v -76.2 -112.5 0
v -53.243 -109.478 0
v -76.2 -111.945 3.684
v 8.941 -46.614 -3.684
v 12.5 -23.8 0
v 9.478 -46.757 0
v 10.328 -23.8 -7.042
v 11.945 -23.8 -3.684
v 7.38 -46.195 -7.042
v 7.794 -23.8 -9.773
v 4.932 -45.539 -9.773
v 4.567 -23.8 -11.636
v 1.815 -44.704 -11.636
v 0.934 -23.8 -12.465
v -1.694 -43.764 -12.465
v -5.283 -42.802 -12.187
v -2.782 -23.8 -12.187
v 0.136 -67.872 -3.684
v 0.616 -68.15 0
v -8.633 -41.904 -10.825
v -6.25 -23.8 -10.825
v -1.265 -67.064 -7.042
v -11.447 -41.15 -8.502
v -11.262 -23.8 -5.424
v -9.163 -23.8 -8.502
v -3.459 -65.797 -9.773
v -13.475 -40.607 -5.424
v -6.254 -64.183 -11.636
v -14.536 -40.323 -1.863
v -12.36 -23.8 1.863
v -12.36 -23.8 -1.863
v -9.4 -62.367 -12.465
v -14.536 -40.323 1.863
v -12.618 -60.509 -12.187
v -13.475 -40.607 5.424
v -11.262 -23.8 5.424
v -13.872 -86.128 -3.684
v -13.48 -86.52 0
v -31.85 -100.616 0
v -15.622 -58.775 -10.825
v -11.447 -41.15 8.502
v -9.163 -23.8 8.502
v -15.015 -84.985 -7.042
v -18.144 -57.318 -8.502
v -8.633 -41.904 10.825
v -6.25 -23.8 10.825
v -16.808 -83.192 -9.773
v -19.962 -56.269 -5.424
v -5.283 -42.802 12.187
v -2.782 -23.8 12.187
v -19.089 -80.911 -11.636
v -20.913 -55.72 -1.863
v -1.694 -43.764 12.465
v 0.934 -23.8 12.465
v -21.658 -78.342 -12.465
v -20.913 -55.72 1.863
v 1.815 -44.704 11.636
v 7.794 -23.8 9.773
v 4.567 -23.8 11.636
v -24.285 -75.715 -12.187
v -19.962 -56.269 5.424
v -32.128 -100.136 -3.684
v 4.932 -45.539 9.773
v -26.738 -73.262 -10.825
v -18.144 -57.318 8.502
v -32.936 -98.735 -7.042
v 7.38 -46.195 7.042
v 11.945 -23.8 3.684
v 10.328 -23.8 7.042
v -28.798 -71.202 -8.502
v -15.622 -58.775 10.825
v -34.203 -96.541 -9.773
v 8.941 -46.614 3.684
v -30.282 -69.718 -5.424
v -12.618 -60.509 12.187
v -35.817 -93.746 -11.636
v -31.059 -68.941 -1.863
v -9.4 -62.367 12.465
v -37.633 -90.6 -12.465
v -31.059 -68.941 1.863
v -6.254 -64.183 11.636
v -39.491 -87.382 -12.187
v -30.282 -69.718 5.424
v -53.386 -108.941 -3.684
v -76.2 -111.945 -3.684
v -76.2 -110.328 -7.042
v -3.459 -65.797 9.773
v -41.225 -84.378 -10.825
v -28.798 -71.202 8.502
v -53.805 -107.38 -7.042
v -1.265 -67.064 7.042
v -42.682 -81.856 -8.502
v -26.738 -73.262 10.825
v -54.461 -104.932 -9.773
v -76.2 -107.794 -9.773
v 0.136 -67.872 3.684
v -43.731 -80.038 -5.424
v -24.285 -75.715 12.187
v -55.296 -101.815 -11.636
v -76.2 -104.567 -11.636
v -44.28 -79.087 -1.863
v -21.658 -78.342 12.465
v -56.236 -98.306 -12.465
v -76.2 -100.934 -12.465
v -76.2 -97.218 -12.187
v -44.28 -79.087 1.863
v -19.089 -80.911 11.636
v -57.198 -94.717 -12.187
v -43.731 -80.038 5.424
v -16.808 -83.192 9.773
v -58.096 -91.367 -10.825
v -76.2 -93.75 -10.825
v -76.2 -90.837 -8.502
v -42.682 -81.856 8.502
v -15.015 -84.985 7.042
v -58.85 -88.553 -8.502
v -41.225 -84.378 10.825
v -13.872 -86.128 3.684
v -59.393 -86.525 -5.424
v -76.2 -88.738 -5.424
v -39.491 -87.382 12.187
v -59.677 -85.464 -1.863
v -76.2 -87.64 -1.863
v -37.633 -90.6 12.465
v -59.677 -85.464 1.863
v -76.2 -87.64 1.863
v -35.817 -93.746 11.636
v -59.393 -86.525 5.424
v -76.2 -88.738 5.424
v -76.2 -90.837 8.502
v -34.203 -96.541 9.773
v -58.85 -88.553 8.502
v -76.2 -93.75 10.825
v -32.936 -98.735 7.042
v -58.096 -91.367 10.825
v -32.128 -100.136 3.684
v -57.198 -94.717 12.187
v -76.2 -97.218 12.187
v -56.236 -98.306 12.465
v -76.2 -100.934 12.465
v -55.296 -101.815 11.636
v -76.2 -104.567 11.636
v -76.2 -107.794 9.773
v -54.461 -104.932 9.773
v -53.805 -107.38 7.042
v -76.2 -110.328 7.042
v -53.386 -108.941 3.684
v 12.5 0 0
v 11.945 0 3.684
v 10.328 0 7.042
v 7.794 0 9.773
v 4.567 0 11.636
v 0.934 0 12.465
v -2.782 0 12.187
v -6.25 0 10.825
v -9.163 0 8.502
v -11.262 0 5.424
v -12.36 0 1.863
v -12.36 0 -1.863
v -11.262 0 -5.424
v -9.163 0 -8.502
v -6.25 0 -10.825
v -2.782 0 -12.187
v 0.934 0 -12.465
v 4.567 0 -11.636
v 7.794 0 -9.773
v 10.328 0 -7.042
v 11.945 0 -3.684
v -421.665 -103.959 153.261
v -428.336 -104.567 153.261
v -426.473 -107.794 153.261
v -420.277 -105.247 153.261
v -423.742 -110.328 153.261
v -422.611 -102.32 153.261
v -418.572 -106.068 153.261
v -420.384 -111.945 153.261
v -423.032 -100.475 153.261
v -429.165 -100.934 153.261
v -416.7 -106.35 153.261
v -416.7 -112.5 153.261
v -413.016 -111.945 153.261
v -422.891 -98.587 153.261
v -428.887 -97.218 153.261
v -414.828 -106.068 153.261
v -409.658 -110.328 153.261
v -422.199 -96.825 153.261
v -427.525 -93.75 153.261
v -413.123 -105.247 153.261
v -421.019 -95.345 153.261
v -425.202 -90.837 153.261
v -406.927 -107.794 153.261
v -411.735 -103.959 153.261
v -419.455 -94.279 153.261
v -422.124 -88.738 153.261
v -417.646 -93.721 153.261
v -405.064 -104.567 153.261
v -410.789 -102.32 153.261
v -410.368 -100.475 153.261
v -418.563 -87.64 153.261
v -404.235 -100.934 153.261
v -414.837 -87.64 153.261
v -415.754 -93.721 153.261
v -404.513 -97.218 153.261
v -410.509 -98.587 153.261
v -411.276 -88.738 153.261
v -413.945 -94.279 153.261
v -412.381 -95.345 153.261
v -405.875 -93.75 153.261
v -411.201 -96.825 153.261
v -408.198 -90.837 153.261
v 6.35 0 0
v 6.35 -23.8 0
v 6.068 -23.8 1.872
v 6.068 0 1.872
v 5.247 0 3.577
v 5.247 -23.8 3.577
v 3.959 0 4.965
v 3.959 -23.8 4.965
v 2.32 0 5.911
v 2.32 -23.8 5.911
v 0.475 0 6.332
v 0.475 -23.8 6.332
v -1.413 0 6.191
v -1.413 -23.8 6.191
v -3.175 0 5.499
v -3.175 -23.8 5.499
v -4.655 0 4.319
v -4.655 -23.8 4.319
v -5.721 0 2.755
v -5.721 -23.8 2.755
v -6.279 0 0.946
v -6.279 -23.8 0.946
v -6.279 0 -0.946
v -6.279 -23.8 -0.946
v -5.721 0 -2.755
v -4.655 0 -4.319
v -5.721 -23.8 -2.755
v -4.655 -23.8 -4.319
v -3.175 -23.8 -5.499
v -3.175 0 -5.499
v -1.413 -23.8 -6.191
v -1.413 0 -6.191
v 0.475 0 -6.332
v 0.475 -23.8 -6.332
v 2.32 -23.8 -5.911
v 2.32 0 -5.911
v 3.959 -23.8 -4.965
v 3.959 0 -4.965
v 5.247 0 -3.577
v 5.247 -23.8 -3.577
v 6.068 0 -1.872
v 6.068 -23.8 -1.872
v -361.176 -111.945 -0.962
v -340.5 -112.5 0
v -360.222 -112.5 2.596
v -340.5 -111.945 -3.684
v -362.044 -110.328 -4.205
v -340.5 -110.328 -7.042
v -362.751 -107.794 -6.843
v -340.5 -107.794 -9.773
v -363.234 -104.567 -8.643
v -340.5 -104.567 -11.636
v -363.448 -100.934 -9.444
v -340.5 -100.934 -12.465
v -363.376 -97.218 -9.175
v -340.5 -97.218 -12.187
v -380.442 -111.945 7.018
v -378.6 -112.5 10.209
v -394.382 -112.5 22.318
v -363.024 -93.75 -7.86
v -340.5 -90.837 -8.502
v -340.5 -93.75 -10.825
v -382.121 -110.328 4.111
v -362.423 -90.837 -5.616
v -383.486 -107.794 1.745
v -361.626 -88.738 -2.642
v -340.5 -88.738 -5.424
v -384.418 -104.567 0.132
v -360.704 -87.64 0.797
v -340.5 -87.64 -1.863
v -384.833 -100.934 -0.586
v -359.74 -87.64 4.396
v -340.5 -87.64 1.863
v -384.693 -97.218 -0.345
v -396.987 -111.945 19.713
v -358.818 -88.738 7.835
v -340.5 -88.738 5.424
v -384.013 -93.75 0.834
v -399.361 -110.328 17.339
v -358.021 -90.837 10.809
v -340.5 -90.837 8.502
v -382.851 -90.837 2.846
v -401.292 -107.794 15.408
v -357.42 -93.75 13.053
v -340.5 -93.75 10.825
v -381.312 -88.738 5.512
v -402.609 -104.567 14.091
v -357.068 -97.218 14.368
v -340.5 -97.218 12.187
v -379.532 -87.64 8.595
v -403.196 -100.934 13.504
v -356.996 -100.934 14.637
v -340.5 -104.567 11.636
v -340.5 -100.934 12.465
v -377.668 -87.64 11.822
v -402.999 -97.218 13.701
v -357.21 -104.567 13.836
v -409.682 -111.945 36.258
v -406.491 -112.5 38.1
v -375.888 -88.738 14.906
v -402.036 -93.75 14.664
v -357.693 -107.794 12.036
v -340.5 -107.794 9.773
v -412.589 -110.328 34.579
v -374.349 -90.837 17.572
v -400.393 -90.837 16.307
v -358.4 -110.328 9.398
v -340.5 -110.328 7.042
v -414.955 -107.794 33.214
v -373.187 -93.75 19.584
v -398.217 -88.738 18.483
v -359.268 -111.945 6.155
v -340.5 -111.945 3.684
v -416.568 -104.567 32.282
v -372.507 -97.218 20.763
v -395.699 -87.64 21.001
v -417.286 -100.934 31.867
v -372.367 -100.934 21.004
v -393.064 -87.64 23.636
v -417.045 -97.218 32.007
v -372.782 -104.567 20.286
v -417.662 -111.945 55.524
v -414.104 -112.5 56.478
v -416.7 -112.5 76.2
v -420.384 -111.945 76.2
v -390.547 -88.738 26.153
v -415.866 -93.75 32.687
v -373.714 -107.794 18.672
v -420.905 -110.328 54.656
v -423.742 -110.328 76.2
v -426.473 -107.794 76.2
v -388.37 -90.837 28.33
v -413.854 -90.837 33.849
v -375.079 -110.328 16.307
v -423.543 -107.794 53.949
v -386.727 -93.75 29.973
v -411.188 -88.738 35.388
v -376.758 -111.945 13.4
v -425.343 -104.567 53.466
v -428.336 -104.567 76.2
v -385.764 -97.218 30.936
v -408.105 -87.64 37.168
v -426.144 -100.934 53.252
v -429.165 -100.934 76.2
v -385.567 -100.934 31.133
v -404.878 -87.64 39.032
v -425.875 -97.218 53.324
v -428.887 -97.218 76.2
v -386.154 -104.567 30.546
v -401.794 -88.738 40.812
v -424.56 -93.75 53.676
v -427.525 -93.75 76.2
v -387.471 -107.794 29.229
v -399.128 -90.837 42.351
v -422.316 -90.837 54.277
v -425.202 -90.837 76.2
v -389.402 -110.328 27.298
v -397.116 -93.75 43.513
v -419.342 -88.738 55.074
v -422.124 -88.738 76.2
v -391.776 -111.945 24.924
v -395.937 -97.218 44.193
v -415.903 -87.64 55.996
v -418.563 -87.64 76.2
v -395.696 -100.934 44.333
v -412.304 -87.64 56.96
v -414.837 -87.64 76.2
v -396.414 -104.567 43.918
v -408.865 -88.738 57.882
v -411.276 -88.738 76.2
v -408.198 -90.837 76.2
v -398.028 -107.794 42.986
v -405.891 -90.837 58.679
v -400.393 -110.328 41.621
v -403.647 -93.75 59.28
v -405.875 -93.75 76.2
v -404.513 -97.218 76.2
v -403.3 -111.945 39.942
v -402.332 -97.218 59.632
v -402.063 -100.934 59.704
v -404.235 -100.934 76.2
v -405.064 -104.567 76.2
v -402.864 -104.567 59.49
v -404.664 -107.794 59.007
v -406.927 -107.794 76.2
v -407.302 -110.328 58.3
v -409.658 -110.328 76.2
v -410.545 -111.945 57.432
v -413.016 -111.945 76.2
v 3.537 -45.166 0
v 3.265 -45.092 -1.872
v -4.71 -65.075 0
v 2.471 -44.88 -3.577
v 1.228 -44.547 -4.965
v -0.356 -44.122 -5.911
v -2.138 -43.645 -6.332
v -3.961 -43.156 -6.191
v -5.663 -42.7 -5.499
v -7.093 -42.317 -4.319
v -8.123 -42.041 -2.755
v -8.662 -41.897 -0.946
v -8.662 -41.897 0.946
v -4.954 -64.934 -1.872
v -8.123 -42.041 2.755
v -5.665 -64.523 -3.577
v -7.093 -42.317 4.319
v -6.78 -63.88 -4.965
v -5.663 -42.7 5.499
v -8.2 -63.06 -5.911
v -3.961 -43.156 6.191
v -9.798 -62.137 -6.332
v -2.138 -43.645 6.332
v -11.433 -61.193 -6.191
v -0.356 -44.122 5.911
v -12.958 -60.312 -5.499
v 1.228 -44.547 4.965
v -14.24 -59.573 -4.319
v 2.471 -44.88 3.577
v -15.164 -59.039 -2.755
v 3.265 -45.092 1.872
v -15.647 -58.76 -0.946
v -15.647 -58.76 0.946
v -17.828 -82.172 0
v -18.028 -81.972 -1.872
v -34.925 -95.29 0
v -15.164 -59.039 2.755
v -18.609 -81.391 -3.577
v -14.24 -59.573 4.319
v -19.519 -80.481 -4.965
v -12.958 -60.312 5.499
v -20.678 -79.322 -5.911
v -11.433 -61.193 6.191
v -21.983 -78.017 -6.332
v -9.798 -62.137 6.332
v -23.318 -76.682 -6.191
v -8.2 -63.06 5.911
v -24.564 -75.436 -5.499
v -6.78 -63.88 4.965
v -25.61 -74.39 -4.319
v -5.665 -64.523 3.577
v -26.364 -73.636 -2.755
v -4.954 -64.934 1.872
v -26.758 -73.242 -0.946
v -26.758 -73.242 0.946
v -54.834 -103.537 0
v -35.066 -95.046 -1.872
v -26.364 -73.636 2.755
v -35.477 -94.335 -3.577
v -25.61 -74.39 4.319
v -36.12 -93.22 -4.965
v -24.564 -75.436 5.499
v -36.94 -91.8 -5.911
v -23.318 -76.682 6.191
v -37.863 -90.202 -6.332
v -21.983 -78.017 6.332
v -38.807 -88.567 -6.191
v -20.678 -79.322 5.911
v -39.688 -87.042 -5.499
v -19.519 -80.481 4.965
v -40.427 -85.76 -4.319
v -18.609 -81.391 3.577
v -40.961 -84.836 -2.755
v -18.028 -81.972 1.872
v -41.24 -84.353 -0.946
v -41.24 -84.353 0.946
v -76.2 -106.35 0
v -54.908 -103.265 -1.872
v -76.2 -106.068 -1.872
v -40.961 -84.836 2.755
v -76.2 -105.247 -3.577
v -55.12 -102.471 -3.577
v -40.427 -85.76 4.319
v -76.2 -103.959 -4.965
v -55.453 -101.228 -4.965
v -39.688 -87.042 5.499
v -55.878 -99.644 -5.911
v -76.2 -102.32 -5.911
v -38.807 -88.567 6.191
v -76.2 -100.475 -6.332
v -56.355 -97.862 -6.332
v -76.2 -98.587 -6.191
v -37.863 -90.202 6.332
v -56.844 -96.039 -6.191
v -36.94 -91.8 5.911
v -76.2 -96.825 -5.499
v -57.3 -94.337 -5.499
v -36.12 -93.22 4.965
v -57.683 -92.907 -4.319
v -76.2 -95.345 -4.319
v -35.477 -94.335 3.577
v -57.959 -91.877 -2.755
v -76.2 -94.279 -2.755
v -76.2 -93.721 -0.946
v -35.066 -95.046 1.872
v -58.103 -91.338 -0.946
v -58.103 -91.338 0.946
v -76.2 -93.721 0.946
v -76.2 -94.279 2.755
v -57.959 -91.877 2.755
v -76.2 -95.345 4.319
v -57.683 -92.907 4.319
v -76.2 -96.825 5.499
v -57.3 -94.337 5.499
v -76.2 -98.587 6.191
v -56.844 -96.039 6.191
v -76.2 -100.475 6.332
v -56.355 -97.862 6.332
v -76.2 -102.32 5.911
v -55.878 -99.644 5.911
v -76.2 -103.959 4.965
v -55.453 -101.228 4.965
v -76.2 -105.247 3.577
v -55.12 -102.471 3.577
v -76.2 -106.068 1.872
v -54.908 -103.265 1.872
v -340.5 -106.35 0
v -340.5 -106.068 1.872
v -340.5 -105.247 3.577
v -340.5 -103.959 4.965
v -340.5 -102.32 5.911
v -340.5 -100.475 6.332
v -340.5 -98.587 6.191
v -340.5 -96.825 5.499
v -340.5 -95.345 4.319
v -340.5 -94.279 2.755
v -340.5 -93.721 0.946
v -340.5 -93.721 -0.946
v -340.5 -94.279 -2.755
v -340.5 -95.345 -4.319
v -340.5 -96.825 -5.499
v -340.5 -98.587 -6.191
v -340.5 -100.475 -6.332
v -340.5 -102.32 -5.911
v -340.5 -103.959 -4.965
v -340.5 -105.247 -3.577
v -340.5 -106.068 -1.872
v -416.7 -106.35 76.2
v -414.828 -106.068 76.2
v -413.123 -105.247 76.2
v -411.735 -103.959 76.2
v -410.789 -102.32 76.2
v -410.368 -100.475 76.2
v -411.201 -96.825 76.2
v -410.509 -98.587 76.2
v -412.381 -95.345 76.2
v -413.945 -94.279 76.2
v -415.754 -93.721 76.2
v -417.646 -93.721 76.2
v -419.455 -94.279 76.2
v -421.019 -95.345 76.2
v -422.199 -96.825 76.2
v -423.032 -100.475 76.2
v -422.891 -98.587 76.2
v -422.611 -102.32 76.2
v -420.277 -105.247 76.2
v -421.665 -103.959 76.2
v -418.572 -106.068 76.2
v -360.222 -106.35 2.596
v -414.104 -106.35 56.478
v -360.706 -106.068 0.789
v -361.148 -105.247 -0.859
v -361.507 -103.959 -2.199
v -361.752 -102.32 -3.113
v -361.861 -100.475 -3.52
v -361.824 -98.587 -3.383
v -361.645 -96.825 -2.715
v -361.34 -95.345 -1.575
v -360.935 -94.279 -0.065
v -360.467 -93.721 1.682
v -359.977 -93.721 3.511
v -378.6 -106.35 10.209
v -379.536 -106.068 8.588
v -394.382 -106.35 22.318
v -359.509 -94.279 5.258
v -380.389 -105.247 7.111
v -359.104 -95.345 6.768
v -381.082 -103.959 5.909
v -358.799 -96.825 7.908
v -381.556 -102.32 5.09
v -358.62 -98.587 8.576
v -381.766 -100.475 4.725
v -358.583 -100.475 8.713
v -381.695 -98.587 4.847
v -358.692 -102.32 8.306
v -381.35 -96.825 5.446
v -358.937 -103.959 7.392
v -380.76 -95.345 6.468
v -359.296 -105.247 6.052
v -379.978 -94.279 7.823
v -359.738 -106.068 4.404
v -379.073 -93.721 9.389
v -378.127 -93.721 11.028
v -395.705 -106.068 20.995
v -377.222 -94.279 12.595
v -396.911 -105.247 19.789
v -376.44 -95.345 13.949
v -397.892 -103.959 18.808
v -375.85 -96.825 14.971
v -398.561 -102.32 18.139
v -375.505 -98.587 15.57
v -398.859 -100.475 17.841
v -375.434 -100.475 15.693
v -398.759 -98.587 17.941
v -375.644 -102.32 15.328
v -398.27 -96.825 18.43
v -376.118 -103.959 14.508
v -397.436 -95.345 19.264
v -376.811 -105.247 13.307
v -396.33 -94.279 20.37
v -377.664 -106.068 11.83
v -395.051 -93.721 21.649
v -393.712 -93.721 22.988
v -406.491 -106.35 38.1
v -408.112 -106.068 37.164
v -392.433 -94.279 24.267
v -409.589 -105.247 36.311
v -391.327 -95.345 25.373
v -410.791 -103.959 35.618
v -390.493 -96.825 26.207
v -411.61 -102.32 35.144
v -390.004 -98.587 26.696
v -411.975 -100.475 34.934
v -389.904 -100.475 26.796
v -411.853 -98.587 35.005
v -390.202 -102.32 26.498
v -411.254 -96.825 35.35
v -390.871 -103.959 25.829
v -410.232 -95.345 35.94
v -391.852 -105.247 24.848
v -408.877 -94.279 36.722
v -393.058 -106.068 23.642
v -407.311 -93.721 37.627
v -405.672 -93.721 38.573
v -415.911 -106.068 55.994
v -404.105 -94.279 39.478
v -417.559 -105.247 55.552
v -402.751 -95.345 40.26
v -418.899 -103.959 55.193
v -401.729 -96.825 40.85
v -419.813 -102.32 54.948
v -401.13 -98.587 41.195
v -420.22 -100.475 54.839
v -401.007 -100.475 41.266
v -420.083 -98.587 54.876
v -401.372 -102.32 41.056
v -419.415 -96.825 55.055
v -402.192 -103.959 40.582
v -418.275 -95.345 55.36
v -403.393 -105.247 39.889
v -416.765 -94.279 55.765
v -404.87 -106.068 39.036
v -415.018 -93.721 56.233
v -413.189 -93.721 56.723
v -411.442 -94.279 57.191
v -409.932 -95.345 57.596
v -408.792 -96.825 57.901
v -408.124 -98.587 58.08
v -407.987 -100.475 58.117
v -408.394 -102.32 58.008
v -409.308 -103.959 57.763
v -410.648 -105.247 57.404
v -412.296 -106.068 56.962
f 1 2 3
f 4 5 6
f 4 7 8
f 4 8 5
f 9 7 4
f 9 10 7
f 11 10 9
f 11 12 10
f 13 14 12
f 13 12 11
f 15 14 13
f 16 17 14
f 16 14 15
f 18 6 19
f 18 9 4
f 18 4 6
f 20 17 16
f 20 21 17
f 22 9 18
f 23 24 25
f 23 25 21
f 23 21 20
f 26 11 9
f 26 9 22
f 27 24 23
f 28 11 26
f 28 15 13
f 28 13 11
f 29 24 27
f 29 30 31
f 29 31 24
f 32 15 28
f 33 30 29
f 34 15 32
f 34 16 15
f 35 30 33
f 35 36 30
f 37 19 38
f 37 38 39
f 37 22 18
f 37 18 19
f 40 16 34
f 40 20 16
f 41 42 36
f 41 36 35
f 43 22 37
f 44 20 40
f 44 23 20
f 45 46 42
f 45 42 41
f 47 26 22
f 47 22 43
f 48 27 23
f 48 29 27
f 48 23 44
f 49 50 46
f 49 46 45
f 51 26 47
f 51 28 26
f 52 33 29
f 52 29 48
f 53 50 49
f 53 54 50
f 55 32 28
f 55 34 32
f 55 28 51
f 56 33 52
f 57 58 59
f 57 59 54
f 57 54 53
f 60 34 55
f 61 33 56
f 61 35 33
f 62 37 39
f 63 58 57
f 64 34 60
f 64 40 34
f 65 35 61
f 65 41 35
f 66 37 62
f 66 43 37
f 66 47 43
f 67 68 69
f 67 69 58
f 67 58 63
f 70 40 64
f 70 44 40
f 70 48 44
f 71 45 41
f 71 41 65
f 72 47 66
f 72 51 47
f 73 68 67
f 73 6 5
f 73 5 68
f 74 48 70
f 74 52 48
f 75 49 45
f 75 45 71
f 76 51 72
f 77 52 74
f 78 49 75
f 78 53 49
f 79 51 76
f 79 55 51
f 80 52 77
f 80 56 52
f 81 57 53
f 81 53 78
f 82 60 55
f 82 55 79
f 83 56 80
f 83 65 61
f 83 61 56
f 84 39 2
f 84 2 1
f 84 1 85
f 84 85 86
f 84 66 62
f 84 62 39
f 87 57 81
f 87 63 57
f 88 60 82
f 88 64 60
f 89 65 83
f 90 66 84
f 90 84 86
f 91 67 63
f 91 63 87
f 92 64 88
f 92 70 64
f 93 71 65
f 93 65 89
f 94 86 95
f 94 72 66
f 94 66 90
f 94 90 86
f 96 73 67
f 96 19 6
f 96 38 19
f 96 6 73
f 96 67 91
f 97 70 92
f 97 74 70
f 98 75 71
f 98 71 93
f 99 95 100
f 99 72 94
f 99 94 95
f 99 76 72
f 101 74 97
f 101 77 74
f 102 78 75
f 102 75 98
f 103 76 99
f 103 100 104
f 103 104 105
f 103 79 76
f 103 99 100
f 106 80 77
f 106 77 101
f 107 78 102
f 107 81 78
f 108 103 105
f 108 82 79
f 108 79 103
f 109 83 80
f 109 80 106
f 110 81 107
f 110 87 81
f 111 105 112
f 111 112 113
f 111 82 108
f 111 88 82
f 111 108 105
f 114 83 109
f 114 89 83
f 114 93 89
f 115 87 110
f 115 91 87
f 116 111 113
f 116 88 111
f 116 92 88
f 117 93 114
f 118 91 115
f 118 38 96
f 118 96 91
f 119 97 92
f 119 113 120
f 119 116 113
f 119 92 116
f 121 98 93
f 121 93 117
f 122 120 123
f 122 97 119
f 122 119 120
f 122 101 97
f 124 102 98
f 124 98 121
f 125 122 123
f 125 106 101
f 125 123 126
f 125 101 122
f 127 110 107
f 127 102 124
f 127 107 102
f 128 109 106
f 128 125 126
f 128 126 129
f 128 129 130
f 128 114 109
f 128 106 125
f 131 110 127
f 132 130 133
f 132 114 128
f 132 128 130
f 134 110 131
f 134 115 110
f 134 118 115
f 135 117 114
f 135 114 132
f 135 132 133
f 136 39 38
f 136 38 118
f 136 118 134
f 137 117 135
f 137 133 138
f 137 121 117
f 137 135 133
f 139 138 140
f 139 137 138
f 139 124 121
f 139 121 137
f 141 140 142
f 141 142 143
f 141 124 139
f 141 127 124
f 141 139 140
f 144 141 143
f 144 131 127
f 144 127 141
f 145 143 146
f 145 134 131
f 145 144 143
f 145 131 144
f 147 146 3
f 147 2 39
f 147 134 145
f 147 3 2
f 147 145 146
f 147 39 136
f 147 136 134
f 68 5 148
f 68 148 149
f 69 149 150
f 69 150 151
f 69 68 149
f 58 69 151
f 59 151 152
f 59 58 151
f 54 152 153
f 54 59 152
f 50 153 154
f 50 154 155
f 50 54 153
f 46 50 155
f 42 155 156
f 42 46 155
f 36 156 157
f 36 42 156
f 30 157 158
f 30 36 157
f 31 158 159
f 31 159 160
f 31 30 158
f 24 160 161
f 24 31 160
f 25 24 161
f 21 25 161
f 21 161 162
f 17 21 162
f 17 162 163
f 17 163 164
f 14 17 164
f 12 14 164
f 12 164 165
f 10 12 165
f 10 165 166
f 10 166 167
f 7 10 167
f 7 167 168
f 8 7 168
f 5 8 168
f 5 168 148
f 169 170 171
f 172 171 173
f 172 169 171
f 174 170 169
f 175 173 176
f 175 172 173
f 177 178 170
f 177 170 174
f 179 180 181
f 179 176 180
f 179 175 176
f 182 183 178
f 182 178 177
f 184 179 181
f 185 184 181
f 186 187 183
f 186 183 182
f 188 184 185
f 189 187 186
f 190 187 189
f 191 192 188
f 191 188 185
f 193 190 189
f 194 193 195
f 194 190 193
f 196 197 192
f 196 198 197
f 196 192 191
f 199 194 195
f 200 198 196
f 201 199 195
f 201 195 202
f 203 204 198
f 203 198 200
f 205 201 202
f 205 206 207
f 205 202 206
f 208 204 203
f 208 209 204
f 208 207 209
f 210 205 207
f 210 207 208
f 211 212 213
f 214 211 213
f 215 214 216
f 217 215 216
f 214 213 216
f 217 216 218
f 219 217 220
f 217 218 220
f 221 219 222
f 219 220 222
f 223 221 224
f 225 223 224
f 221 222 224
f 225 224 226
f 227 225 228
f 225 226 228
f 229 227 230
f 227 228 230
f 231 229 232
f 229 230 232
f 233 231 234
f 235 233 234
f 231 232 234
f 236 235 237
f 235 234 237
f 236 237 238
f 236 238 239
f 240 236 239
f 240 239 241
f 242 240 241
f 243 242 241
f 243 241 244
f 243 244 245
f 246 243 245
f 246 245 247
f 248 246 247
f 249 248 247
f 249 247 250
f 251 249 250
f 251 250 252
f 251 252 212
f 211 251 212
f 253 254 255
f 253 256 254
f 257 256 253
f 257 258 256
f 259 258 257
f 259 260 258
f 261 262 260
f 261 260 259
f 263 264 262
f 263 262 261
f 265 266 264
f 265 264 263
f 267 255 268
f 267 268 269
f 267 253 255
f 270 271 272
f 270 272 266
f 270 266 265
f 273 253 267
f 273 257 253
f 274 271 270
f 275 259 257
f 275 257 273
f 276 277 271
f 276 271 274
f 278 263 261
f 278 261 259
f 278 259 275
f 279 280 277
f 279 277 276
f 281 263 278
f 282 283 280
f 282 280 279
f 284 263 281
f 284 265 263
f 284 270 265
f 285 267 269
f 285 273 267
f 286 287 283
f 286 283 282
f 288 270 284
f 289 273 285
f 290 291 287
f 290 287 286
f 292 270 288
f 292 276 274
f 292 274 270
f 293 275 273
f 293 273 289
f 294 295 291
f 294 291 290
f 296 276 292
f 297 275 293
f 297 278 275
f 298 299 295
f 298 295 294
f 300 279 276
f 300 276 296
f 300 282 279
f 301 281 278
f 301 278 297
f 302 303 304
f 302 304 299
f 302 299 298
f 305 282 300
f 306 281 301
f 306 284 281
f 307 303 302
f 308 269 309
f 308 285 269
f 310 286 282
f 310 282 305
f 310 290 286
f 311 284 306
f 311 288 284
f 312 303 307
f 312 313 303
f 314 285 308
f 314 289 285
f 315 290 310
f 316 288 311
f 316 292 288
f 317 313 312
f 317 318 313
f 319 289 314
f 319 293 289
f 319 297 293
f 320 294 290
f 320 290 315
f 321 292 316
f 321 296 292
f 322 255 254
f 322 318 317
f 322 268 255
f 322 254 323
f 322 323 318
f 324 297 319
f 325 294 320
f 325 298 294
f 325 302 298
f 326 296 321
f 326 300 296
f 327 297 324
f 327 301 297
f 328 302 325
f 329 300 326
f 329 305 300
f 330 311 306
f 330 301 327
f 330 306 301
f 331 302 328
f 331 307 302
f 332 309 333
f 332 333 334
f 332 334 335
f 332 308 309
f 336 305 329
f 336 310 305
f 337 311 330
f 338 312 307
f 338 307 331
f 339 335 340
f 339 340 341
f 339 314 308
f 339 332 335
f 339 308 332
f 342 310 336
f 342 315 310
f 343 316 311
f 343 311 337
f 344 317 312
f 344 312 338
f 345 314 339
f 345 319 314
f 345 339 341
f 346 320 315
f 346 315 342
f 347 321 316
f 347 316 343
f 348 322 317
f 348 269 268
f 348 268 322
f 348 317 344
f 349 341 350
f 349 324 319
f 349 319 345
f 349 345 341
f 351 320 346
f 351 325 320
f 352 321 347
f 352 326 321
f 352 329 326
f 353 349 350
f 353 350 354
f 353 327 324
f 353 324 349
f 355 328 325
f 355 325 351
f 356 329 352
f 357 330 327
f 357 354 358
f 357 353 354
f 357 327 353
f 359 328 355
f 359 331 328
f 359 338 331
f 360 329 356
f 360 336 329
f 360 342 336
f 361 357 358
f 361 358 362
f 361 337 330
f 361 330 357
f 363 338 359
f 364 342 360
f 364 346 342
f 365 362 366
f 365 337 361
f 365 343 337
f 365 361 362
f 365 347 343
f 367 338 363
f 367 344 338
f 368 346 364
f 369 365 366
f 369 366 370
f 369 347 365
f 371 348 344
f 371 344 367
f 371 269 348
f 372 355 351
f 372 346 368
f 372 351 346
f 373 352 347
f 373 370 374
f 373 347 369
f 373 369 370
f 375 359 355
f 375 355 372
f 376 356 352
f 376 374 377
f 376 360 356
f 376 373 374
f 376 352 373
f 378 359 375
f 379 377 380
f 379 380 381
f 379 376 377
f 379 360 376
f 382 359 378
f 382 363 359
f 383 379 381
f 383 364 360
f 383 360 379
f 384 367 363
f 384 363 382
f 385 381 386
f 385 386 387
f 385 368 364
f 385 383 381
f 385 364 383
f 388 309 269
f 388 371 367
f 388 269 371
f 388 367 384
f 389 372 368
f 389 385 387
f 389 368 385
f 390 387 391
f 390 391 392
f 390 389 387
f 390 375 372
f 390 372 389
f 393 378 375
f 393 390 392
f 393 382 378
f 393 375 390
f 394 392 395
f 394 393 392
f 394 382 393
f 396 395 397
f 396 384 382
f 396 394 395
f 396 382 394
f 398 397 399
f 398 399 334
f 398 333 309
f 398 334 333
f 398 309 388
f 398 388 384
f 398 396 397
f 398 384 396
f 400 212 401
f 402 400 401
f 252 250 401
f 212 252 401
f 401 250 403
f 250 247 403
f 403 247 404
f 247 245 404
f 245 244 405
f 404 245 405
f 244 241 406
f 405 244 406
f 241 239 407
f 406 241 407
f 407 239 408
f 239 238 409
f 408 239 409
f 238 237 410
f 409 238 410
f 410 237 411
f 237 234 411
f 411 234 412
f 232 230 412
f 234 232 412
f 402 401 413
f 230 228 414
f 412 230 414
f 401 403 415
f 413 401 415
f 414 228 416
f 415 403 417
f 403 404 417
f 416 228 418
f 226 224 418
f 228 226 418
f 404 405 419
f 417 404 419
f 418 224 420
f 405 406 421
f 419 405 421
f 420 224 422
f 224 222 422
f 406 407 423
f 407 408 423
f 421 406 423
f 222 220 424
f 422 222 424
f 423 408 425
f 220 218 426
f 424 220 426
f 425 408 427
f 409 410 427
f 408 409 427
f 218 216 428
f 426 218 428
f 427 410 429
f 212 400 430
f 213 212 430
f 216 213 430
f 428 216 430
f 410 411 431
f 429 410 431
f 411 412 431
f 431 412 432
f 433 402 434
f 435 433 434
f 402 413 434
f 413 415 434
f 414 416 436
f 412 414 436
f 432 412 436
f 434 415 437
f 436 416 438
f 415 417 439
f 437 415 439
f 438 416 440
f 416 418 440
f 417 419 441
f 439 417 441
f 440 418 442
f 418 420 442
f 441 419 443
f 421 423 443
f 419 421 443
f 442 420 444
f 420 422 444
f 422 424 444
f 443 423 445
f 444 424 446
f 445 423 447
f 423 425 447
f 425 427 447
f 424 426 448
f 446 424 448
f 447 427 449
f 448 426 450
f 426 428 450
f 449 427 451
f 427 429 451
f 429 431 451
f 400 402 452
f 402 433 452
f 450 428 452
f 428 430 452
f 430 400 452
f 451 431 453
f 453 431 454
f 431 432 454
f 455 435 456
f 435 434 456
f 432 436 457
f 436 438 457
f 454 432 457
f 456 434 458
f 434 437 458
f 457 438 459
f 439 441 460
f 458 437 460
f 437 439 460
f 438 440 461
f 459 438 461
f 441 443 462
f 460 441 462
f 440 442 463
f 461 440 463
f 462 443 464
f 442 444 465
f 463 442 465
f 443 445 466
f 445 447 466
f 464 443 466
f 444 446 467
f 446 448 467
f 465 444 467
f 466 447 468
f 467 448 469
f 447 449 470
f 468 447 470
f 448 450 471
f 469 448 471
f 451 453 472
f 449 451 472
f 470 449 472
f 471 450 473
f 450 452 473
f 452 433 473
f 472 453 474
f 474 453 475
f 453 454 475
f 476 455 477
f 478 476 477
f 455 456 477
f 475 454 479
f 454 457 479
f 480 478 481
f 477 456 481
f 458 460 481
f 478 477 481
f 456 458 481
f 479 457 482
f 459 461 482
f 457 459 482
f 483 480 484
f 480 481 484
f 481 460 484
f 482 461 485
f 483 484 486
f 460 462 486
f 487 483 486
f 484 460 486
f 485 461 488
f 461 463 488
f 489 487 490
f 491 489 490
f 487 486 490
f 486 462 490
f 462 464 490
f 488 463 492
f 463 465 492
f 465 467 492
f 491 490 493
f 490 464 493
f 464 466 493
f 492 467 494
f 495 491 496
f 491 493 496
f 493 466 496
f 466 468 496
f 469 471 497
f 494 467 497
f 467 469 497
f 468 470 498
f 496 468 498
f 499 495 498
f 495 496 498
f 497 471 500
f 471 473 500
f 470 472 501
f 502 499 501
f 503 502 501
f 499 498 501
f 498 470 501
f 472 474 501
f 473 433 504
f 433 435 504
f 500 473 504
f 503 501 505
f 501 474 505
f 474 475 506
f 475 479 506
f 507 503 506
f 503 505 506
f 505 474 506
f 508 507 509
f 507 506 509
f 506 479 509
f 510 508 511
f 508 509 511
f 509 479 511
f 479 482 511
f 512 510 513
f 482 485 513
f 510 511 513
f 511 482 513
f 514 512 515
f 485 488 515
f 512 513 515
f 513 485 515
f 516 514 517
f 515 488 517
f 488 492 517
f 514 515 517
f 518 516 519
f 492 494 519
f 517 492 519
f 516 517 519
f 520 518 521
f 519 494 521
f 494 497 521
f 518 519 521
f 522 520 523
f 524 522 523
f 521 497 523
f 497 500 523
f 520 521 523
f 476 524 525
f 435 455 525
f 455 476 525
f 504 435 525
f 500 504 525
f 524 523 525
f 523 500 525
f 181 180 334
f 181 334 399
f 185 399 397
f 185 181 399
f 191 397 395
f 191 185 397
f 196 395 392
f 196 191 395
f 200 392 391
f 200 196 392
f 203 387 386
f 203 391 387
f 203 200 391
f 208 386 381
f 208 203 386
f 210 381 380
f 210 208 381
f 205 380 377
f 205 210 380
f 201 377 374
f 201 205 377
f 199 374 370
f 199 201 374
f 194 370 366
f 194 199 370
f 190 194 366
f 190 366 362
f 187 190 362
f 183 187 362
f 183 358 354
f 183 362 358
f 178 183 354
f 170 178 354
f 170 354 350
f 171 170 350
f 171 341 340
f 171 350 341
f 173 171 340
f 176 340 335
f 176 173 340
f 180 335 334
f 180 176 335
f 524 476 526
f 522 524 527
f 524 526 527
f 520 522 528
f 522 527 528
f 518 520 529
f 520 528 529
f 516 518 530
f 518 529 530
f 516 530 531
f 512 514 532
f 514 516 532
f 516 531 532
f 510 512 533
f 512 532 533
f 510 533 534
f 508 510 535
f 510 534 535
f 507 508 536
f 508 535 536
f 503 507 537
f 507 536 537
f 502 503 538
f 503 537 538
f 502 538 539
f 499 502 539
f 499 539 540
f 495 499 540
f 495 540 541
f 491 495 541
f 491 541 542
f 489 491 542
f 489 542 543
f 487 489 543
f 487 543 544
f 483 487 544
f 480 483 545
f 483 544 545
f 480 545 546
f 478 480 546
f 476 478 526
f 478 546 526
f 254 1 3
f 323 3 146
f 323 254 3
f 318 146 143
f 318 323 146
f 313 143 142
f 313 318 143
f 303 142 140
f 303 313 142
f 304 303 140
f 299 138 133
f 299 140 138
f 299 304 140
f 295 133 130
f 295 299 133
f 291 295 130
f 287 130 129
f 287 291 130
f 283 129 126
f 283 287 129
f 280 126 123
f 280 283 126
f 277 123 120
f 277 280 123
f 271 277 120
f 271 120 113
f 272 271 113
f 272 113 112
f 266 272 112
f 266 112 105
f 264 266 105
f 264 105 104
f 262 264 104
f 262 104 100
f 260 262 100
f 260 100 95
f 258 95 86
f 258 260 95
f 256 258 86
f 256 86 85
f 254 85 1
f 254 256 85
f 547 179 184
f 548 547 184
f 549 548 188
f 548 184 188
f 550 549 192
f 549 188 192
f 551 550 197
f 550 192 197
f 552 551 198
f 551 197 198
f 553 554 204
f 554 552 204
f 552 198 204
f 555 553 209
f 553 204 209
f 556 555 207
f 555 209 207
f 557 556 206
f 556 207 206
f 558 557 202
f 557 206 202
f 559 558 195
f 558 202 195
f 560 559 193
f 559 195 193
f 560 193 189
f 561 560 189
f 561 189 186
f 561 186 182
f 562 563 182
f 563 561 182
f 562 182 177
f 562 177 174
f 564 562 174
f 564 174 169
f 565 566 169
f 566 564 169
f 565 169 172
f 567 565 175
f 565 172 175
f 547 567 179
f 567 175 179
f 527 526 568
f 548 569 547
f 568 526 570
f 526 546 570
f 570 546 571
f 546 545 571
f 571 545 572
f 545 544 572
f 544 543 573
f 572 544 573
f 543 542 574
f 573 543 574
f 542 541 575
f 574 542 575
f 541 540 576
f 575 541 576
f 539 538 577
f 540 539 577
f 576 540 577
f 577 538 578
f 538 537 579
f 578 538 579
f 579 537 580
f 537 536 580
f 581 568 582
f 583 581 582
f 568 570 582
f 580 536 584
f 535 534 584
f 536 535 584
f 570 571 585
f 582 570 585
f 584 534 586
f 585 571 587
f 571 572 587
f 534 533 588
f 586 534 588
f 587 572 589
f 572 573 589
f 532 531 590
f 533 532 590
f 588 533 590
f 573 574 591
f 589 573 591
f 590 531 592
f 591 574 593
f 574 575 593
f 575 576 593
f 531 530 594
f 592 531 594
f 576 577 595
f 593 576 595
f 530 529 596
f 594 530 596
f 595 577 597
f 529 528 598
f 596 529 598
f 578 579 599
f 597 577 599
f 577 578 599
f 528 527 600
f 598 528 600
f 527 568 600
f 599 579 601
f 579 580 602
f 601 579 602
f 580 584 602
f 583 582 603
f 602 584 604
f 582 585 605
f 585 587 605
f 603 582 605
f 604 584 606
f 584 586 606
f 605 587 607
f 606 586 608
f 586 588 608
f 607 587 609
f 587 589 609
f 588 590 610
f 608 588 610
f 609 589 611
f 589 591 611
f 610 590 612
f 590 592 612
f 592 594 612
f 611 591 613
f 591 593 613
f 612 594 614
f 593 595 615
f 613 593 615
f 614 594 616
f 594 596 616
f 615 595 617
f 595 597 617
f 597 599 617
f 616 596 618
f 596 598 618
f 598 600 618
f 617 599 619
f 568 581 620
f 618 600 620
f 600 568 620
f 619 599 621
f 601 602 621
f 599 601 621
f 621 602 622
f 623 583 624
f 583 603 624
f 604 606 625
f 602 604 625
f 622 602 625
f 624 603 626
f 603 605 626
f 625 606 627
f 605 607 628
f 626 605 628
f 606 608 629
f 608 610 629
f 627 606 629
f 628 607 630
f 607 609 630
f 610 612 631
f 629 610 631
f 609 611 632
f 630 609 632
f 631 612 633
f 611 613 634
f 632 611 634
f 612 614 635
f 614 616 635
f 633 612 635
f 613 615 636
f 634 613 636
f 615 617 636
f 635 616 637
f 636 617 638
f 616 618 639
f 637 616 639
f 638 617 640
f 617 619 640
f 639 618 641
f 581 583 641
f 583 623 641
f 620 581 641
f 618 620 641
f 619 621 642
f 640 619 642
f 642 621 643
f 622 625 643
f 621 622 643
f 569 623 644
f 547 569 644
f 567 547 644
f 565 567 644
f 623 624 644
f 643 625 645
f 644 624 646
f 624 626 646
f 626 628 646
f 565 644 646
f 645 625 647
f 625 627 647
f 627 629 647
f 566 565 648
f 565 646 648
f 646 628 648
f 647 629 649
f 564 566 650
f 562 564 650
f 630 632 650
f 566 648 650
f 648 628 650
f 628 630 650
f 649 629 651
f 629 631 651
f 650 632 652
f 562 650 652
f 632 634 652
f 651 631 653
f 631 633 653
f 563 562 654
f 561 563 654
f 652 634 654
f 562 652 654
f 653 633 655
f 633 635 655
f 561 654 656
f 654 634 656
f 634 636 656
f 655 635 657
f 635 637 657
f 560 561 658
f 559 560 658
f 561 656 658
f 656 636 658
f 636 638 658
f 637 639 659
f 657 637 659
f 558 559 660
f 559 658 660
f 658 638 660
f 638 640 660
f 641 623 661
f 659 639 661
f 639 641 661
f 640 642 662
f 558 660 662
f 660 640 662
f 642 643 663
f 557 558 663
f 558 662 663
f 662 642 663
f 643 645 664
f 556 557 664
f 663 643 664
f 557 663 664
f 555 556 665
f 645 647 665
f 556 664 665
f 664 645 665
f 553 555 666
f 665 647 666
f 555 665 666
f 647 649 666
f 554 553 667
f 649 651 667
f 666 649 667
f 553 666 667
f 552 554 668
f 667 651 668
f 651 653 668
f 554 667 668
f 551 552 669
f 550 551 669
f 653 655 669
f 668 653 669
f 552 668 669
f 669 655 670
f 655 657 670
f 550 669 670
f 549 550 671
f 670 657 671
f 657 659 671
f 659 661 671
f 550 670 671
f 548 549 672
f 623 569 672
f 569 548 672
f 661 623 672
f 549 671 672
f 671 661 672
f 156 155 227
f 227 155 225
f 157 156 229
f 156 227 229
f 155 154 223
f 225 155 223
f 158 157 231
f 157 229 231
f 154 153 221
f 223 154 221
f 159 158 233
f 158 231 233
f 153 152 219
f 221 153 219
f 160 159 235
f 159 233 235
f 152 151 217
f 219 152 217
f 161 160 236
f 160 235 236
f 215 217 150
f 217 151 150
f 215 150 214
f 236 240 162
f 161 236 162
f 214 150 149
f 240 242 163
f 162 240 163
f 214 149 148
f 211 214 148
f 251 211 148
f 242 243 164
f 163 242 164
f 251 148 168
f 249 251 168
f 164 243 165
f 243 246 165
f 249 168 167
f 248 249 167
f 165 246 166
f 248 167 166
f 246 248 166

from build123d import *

# Parameters (mm, degrees)
F0_R   = 12.5
F0_R_2 = 6.35


with BuildPart() as f4:
    # F4: sweep along a path in F1, F3
    with BuildLine(Plane.XY) as f4_path:
        Line((0, 0), (0, -23.8))
        ThreePointArc((0, -23.8), (-22.3184632736, -77.6815367264), (-76.2, -100))
        Line((-76.2, -100), (-340.5, -100))
    with BuildLine(Plane.XZ.offset(100)) as f4_path_2:
        ThreePointArc((-340.5, 0), (-394.3815367264, 22.3184632736), (-416.7, 76.2))
        Line((-416.7, 76.2), (-416.7, 153.261))
    # F0 (on Front) → F4 (sweep)
    with BuildSketch(Plane.XZ):
        Circle(F0_R)
        Circle(F0_R_2, mode=Mode.SUBTRACT)
    sweep(path=f4_path.line + f4_path_2.line)


solid = f4.part
